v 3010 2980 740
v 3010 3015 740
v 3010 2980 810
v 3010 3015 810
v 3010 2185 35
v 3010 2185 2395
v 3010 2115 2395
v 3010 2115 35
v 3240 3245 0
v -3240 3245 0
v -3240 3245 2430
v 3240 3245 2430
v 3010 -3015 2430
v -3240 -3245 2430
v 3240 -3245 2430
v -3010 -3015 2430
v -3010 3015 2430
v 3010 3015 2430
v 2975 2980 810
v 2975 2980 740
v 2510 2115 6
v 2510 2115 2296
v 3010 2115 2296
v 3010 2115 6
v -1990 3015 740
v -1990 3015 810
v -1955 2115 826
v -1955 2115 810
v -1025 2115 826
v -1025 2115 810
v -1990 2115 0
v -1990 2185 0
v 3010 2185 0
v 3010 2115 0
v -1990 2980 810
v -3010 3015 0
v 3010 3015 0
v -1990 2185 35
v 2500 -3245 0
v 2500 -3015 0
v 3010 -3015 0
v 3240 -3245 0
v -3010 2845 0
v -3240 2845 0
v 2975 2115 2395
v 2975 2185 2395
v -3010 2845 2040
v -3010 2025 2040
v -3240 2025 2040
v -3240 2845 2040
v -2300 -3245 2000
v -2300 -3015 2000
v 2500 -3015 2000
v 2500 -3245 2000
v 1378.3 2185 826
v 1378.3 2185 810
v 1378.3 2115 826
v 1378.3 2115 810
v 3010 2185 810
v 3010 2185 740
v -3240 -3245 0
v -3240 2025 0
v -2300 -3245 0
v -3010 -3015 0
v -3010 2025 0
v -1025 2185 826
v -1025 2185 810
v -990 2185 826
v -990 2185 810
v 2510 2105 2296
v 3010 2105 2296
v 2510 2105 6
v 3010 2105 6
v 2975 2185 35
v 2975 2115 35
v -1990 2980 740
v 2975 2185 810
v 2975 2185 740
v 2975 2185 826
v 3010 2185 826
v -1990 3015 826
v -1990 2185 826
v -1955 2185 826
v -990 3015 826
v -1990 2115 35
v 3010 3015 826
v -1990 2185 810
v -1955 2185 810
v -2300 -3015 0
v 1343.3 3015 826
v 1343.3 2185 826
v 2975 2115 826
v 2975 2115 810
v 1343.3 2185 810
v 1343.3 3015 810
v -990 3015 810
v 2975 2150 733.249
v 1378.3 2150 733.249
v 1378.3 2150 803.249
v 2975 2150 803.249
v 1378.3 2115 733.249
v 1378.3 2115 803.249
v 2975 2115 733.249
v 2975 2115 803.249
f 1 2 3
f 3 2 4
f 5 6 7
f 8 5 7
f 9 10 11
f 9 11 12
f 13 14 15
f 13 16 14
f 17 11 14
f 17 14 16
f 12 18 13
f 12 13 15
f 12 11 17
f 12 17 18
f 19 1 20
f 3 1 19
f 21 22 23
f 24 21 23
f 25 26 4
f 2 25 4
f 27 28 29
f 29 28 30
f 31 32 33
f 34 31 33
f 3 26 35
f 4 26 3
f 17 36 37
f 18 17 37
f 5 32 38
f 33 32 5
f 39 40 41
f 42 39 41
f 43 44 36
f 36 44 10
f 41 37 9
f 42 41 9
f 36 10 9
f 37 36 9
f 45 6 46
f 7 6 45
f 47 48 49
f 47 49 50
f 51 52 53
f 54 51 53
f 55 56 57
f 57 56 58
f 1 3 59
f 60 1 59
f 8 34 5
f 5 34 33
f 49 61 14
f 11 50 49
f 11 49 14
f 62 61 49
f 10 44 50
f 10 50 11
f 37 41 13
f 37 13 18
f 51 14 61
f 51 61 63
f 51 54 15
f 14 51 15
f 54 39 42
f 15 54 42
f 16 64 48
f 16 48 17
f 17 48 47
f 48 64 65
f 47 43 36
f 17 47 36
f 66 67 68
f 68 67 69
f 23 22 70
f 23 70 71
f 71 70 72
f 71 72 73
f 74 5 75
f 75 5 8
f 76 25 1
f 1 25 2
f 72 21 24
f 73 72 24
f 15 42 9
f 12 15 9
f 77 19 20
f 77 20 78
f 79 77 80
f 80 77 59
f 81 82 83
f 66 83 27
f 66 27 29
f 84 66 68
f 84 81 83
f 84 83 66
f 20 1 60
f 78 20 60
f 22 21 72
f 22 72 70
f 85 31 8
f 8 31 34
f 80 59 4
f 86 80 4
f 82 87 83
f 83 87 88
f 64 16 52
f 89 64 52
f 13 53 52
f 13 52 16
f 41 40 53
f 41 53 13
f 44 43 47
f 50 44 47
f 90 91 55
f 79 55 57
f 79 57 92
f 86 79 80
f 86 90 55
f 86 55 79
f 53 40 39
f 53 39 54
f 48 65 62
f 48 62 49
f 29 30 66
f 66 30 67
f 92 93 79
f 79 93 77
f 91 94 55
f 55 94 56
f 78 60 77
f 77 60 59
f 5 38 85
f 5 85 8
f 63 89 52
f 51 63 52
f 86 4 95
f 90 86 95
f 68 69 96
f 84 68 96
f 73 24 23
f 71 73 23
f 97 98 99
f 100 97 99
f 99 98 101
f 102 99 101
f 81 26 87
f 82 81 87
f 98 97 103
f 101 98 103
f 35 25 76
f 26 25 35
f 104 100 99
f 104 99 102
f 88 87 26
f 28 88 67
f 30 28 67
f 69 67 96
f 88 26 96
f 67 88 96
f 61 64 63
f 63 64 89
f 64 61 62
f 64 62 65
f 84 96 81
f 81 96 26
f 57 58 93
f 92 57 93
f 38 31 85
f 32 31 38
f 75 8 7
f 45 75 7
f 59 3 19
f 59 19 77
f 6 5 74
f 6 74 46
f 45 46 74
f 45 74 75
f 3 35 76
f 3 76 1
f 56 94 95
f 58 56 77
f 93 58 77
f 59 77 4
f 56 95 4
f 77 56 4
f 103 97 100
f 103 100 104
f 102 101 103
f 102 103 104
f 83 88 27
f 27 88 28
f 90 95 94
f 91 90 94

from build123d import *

# Parameters (mm, degrees)
F0_W      = 6480
F0_H      = 6490
F0_W_2    = 6020
F0_H_2    = 6030
F1_DEPTH  = 2430
F2_W      = 4800
F2_H      = 2000
F3_DEPTH  = 3245.001
F4_W      = 820
F4_H      = 2040
F5_DEPTH  = 3240.001
F6_W      = 5000
F6_H      = 70
F7_DEPTH  = 35
F8_W      = 795
F8_H      = 70
F9_DEPTH  = 35
F10_W     = 70
F10_H     = 2360
F11_DEPTH = 35
F12_W     = 5000
F12_H     = 70
F13_DEPTH = 35
F14_W     = 500
F14_H     = 2290
F15_DEPTH = 10
F17_DEPTH = 16
F19_DEPTH = 16
F20_W     = 35
F20_H     = 70
F21_DEPTH = 1596.7


with BuildPart() as f1:
    # F0 (on Top) → F1 (new body)
    with BuildSketch(Plane.XY):
        Rectangle(F0_W, F0_H)
        Rectangle(F0_W_2, F0_H_2, mode=Mode.SUBTRACT)
    extrude(amount=F1_DEPTH)

    # F2 (on Front) → F3 (cut, through all)
    with BuildSketch(Plane.XZ):
        with Locations((100, 1000)):
            Rectangle(F2_W, F2_H)
    extrude(amount=F3_DEPTH, mode=Mode.SUBTRACT)

    # F4 (on Right) → F5 (cut, through all)
    with BuildSketch(Plane.YZ):
        with Locations((2435, 1020)):
            Rectangle(F4_W, F4_H)
    extrude(amount=-F5_DEPTH, mode=Mode.SUBTRACT)


with BuildPart() as f7:
    # F6 (on face) → F7 (new body)
    with BuildSketch(Plane.XZ.offset(-3015)):
        with Locations((510, 775)):
            Rectangle(F6_W, F6_H)
    extrude(amount=F7_DEPTH)


with BuildPart() as f9:
    # F8 (on face) → F9 (new body)
    with BuildSketch(Plane(origin=(3010, 0, 0), x_dir=(0, -1, 0), z_dir=(-1, 0, 0))):
        with Locations((-2582.5, 775)):
            Rectangle(F8_W, F8_H)
    extrude(amount=F9_DEPTH)


with BuildPart() as f11:
    # F10 (on face) → F11 (new body)
    with BuildSketch(Plane(origin=(3010, 0, 0), x_dir=(0, -1, 0), z_dir=(-1, 0, 0))):
        with Locations((-2150, 1215)):
            Rectangle(F10_W, F10_H)
    extrude(amount=F11_DEPTH)


with BuildPart() as f13:
    # F12 (on Top) → F13 (new body)
    with BuildSketch(Plane.XY):
        with Locations((510, 2150)):
            Rectangle(F12_W, F12_H)
    extrude(amount=F13_DEPTH)


with BuildPart() as f15:
    # F14 (on face) → F15 (new body)
    with BuildSketch(Plane.XZ.offset(-2115)):
        with Locations((2760, 1151)):
            Rectangle(F14_W, F14_H)
    extrude(amount=F15_DEPTH)


with BuildPart() as f17:
    # F16 (on face) → F17 (new body)
    with BuildSketch(Plane.XY.offset(810)):
        Polygon((3010, 2185), (3010, 3015), (1343.3, 3015), (1343.3, 2185), (1378.3, 2185), (1378.3, 2115), (2975, 2115), (2975, 2185), align=None)
    extrude(amount=F17_DEPTH)


with BuildPart() as f19:
    # F18 (on face) → F19 (new body)
    with BuildSketch(Plane.XY.offset(810)):
        Polygon((-990, 3015), (-1990, 3015), (-1990, 2185), (-1955, 2185), (-1955, 2115), (-1025, 2115), (-1025, 2185), (-990, 2185), align=None)
    extrude(amount=F19_DEPTH)


with BuildPart() as f21:
    # F20 (on face) → F21 (new body)
    with BuildSketch(Plane(origin=(2975, 0, 0), x_dir=(0, -1, 0), z_dir=(-1, 0, 0))):
        with Locations((-2132.5, 768.249478)):
            Rectangle(F20_W, F20_H)
    extrude(amount=F21_DEPTH)


solid = Compound([f1.part, f7.part, f9.part, f11.part, f13.part, f15.part, f17.part, f19.part, f21.part])
